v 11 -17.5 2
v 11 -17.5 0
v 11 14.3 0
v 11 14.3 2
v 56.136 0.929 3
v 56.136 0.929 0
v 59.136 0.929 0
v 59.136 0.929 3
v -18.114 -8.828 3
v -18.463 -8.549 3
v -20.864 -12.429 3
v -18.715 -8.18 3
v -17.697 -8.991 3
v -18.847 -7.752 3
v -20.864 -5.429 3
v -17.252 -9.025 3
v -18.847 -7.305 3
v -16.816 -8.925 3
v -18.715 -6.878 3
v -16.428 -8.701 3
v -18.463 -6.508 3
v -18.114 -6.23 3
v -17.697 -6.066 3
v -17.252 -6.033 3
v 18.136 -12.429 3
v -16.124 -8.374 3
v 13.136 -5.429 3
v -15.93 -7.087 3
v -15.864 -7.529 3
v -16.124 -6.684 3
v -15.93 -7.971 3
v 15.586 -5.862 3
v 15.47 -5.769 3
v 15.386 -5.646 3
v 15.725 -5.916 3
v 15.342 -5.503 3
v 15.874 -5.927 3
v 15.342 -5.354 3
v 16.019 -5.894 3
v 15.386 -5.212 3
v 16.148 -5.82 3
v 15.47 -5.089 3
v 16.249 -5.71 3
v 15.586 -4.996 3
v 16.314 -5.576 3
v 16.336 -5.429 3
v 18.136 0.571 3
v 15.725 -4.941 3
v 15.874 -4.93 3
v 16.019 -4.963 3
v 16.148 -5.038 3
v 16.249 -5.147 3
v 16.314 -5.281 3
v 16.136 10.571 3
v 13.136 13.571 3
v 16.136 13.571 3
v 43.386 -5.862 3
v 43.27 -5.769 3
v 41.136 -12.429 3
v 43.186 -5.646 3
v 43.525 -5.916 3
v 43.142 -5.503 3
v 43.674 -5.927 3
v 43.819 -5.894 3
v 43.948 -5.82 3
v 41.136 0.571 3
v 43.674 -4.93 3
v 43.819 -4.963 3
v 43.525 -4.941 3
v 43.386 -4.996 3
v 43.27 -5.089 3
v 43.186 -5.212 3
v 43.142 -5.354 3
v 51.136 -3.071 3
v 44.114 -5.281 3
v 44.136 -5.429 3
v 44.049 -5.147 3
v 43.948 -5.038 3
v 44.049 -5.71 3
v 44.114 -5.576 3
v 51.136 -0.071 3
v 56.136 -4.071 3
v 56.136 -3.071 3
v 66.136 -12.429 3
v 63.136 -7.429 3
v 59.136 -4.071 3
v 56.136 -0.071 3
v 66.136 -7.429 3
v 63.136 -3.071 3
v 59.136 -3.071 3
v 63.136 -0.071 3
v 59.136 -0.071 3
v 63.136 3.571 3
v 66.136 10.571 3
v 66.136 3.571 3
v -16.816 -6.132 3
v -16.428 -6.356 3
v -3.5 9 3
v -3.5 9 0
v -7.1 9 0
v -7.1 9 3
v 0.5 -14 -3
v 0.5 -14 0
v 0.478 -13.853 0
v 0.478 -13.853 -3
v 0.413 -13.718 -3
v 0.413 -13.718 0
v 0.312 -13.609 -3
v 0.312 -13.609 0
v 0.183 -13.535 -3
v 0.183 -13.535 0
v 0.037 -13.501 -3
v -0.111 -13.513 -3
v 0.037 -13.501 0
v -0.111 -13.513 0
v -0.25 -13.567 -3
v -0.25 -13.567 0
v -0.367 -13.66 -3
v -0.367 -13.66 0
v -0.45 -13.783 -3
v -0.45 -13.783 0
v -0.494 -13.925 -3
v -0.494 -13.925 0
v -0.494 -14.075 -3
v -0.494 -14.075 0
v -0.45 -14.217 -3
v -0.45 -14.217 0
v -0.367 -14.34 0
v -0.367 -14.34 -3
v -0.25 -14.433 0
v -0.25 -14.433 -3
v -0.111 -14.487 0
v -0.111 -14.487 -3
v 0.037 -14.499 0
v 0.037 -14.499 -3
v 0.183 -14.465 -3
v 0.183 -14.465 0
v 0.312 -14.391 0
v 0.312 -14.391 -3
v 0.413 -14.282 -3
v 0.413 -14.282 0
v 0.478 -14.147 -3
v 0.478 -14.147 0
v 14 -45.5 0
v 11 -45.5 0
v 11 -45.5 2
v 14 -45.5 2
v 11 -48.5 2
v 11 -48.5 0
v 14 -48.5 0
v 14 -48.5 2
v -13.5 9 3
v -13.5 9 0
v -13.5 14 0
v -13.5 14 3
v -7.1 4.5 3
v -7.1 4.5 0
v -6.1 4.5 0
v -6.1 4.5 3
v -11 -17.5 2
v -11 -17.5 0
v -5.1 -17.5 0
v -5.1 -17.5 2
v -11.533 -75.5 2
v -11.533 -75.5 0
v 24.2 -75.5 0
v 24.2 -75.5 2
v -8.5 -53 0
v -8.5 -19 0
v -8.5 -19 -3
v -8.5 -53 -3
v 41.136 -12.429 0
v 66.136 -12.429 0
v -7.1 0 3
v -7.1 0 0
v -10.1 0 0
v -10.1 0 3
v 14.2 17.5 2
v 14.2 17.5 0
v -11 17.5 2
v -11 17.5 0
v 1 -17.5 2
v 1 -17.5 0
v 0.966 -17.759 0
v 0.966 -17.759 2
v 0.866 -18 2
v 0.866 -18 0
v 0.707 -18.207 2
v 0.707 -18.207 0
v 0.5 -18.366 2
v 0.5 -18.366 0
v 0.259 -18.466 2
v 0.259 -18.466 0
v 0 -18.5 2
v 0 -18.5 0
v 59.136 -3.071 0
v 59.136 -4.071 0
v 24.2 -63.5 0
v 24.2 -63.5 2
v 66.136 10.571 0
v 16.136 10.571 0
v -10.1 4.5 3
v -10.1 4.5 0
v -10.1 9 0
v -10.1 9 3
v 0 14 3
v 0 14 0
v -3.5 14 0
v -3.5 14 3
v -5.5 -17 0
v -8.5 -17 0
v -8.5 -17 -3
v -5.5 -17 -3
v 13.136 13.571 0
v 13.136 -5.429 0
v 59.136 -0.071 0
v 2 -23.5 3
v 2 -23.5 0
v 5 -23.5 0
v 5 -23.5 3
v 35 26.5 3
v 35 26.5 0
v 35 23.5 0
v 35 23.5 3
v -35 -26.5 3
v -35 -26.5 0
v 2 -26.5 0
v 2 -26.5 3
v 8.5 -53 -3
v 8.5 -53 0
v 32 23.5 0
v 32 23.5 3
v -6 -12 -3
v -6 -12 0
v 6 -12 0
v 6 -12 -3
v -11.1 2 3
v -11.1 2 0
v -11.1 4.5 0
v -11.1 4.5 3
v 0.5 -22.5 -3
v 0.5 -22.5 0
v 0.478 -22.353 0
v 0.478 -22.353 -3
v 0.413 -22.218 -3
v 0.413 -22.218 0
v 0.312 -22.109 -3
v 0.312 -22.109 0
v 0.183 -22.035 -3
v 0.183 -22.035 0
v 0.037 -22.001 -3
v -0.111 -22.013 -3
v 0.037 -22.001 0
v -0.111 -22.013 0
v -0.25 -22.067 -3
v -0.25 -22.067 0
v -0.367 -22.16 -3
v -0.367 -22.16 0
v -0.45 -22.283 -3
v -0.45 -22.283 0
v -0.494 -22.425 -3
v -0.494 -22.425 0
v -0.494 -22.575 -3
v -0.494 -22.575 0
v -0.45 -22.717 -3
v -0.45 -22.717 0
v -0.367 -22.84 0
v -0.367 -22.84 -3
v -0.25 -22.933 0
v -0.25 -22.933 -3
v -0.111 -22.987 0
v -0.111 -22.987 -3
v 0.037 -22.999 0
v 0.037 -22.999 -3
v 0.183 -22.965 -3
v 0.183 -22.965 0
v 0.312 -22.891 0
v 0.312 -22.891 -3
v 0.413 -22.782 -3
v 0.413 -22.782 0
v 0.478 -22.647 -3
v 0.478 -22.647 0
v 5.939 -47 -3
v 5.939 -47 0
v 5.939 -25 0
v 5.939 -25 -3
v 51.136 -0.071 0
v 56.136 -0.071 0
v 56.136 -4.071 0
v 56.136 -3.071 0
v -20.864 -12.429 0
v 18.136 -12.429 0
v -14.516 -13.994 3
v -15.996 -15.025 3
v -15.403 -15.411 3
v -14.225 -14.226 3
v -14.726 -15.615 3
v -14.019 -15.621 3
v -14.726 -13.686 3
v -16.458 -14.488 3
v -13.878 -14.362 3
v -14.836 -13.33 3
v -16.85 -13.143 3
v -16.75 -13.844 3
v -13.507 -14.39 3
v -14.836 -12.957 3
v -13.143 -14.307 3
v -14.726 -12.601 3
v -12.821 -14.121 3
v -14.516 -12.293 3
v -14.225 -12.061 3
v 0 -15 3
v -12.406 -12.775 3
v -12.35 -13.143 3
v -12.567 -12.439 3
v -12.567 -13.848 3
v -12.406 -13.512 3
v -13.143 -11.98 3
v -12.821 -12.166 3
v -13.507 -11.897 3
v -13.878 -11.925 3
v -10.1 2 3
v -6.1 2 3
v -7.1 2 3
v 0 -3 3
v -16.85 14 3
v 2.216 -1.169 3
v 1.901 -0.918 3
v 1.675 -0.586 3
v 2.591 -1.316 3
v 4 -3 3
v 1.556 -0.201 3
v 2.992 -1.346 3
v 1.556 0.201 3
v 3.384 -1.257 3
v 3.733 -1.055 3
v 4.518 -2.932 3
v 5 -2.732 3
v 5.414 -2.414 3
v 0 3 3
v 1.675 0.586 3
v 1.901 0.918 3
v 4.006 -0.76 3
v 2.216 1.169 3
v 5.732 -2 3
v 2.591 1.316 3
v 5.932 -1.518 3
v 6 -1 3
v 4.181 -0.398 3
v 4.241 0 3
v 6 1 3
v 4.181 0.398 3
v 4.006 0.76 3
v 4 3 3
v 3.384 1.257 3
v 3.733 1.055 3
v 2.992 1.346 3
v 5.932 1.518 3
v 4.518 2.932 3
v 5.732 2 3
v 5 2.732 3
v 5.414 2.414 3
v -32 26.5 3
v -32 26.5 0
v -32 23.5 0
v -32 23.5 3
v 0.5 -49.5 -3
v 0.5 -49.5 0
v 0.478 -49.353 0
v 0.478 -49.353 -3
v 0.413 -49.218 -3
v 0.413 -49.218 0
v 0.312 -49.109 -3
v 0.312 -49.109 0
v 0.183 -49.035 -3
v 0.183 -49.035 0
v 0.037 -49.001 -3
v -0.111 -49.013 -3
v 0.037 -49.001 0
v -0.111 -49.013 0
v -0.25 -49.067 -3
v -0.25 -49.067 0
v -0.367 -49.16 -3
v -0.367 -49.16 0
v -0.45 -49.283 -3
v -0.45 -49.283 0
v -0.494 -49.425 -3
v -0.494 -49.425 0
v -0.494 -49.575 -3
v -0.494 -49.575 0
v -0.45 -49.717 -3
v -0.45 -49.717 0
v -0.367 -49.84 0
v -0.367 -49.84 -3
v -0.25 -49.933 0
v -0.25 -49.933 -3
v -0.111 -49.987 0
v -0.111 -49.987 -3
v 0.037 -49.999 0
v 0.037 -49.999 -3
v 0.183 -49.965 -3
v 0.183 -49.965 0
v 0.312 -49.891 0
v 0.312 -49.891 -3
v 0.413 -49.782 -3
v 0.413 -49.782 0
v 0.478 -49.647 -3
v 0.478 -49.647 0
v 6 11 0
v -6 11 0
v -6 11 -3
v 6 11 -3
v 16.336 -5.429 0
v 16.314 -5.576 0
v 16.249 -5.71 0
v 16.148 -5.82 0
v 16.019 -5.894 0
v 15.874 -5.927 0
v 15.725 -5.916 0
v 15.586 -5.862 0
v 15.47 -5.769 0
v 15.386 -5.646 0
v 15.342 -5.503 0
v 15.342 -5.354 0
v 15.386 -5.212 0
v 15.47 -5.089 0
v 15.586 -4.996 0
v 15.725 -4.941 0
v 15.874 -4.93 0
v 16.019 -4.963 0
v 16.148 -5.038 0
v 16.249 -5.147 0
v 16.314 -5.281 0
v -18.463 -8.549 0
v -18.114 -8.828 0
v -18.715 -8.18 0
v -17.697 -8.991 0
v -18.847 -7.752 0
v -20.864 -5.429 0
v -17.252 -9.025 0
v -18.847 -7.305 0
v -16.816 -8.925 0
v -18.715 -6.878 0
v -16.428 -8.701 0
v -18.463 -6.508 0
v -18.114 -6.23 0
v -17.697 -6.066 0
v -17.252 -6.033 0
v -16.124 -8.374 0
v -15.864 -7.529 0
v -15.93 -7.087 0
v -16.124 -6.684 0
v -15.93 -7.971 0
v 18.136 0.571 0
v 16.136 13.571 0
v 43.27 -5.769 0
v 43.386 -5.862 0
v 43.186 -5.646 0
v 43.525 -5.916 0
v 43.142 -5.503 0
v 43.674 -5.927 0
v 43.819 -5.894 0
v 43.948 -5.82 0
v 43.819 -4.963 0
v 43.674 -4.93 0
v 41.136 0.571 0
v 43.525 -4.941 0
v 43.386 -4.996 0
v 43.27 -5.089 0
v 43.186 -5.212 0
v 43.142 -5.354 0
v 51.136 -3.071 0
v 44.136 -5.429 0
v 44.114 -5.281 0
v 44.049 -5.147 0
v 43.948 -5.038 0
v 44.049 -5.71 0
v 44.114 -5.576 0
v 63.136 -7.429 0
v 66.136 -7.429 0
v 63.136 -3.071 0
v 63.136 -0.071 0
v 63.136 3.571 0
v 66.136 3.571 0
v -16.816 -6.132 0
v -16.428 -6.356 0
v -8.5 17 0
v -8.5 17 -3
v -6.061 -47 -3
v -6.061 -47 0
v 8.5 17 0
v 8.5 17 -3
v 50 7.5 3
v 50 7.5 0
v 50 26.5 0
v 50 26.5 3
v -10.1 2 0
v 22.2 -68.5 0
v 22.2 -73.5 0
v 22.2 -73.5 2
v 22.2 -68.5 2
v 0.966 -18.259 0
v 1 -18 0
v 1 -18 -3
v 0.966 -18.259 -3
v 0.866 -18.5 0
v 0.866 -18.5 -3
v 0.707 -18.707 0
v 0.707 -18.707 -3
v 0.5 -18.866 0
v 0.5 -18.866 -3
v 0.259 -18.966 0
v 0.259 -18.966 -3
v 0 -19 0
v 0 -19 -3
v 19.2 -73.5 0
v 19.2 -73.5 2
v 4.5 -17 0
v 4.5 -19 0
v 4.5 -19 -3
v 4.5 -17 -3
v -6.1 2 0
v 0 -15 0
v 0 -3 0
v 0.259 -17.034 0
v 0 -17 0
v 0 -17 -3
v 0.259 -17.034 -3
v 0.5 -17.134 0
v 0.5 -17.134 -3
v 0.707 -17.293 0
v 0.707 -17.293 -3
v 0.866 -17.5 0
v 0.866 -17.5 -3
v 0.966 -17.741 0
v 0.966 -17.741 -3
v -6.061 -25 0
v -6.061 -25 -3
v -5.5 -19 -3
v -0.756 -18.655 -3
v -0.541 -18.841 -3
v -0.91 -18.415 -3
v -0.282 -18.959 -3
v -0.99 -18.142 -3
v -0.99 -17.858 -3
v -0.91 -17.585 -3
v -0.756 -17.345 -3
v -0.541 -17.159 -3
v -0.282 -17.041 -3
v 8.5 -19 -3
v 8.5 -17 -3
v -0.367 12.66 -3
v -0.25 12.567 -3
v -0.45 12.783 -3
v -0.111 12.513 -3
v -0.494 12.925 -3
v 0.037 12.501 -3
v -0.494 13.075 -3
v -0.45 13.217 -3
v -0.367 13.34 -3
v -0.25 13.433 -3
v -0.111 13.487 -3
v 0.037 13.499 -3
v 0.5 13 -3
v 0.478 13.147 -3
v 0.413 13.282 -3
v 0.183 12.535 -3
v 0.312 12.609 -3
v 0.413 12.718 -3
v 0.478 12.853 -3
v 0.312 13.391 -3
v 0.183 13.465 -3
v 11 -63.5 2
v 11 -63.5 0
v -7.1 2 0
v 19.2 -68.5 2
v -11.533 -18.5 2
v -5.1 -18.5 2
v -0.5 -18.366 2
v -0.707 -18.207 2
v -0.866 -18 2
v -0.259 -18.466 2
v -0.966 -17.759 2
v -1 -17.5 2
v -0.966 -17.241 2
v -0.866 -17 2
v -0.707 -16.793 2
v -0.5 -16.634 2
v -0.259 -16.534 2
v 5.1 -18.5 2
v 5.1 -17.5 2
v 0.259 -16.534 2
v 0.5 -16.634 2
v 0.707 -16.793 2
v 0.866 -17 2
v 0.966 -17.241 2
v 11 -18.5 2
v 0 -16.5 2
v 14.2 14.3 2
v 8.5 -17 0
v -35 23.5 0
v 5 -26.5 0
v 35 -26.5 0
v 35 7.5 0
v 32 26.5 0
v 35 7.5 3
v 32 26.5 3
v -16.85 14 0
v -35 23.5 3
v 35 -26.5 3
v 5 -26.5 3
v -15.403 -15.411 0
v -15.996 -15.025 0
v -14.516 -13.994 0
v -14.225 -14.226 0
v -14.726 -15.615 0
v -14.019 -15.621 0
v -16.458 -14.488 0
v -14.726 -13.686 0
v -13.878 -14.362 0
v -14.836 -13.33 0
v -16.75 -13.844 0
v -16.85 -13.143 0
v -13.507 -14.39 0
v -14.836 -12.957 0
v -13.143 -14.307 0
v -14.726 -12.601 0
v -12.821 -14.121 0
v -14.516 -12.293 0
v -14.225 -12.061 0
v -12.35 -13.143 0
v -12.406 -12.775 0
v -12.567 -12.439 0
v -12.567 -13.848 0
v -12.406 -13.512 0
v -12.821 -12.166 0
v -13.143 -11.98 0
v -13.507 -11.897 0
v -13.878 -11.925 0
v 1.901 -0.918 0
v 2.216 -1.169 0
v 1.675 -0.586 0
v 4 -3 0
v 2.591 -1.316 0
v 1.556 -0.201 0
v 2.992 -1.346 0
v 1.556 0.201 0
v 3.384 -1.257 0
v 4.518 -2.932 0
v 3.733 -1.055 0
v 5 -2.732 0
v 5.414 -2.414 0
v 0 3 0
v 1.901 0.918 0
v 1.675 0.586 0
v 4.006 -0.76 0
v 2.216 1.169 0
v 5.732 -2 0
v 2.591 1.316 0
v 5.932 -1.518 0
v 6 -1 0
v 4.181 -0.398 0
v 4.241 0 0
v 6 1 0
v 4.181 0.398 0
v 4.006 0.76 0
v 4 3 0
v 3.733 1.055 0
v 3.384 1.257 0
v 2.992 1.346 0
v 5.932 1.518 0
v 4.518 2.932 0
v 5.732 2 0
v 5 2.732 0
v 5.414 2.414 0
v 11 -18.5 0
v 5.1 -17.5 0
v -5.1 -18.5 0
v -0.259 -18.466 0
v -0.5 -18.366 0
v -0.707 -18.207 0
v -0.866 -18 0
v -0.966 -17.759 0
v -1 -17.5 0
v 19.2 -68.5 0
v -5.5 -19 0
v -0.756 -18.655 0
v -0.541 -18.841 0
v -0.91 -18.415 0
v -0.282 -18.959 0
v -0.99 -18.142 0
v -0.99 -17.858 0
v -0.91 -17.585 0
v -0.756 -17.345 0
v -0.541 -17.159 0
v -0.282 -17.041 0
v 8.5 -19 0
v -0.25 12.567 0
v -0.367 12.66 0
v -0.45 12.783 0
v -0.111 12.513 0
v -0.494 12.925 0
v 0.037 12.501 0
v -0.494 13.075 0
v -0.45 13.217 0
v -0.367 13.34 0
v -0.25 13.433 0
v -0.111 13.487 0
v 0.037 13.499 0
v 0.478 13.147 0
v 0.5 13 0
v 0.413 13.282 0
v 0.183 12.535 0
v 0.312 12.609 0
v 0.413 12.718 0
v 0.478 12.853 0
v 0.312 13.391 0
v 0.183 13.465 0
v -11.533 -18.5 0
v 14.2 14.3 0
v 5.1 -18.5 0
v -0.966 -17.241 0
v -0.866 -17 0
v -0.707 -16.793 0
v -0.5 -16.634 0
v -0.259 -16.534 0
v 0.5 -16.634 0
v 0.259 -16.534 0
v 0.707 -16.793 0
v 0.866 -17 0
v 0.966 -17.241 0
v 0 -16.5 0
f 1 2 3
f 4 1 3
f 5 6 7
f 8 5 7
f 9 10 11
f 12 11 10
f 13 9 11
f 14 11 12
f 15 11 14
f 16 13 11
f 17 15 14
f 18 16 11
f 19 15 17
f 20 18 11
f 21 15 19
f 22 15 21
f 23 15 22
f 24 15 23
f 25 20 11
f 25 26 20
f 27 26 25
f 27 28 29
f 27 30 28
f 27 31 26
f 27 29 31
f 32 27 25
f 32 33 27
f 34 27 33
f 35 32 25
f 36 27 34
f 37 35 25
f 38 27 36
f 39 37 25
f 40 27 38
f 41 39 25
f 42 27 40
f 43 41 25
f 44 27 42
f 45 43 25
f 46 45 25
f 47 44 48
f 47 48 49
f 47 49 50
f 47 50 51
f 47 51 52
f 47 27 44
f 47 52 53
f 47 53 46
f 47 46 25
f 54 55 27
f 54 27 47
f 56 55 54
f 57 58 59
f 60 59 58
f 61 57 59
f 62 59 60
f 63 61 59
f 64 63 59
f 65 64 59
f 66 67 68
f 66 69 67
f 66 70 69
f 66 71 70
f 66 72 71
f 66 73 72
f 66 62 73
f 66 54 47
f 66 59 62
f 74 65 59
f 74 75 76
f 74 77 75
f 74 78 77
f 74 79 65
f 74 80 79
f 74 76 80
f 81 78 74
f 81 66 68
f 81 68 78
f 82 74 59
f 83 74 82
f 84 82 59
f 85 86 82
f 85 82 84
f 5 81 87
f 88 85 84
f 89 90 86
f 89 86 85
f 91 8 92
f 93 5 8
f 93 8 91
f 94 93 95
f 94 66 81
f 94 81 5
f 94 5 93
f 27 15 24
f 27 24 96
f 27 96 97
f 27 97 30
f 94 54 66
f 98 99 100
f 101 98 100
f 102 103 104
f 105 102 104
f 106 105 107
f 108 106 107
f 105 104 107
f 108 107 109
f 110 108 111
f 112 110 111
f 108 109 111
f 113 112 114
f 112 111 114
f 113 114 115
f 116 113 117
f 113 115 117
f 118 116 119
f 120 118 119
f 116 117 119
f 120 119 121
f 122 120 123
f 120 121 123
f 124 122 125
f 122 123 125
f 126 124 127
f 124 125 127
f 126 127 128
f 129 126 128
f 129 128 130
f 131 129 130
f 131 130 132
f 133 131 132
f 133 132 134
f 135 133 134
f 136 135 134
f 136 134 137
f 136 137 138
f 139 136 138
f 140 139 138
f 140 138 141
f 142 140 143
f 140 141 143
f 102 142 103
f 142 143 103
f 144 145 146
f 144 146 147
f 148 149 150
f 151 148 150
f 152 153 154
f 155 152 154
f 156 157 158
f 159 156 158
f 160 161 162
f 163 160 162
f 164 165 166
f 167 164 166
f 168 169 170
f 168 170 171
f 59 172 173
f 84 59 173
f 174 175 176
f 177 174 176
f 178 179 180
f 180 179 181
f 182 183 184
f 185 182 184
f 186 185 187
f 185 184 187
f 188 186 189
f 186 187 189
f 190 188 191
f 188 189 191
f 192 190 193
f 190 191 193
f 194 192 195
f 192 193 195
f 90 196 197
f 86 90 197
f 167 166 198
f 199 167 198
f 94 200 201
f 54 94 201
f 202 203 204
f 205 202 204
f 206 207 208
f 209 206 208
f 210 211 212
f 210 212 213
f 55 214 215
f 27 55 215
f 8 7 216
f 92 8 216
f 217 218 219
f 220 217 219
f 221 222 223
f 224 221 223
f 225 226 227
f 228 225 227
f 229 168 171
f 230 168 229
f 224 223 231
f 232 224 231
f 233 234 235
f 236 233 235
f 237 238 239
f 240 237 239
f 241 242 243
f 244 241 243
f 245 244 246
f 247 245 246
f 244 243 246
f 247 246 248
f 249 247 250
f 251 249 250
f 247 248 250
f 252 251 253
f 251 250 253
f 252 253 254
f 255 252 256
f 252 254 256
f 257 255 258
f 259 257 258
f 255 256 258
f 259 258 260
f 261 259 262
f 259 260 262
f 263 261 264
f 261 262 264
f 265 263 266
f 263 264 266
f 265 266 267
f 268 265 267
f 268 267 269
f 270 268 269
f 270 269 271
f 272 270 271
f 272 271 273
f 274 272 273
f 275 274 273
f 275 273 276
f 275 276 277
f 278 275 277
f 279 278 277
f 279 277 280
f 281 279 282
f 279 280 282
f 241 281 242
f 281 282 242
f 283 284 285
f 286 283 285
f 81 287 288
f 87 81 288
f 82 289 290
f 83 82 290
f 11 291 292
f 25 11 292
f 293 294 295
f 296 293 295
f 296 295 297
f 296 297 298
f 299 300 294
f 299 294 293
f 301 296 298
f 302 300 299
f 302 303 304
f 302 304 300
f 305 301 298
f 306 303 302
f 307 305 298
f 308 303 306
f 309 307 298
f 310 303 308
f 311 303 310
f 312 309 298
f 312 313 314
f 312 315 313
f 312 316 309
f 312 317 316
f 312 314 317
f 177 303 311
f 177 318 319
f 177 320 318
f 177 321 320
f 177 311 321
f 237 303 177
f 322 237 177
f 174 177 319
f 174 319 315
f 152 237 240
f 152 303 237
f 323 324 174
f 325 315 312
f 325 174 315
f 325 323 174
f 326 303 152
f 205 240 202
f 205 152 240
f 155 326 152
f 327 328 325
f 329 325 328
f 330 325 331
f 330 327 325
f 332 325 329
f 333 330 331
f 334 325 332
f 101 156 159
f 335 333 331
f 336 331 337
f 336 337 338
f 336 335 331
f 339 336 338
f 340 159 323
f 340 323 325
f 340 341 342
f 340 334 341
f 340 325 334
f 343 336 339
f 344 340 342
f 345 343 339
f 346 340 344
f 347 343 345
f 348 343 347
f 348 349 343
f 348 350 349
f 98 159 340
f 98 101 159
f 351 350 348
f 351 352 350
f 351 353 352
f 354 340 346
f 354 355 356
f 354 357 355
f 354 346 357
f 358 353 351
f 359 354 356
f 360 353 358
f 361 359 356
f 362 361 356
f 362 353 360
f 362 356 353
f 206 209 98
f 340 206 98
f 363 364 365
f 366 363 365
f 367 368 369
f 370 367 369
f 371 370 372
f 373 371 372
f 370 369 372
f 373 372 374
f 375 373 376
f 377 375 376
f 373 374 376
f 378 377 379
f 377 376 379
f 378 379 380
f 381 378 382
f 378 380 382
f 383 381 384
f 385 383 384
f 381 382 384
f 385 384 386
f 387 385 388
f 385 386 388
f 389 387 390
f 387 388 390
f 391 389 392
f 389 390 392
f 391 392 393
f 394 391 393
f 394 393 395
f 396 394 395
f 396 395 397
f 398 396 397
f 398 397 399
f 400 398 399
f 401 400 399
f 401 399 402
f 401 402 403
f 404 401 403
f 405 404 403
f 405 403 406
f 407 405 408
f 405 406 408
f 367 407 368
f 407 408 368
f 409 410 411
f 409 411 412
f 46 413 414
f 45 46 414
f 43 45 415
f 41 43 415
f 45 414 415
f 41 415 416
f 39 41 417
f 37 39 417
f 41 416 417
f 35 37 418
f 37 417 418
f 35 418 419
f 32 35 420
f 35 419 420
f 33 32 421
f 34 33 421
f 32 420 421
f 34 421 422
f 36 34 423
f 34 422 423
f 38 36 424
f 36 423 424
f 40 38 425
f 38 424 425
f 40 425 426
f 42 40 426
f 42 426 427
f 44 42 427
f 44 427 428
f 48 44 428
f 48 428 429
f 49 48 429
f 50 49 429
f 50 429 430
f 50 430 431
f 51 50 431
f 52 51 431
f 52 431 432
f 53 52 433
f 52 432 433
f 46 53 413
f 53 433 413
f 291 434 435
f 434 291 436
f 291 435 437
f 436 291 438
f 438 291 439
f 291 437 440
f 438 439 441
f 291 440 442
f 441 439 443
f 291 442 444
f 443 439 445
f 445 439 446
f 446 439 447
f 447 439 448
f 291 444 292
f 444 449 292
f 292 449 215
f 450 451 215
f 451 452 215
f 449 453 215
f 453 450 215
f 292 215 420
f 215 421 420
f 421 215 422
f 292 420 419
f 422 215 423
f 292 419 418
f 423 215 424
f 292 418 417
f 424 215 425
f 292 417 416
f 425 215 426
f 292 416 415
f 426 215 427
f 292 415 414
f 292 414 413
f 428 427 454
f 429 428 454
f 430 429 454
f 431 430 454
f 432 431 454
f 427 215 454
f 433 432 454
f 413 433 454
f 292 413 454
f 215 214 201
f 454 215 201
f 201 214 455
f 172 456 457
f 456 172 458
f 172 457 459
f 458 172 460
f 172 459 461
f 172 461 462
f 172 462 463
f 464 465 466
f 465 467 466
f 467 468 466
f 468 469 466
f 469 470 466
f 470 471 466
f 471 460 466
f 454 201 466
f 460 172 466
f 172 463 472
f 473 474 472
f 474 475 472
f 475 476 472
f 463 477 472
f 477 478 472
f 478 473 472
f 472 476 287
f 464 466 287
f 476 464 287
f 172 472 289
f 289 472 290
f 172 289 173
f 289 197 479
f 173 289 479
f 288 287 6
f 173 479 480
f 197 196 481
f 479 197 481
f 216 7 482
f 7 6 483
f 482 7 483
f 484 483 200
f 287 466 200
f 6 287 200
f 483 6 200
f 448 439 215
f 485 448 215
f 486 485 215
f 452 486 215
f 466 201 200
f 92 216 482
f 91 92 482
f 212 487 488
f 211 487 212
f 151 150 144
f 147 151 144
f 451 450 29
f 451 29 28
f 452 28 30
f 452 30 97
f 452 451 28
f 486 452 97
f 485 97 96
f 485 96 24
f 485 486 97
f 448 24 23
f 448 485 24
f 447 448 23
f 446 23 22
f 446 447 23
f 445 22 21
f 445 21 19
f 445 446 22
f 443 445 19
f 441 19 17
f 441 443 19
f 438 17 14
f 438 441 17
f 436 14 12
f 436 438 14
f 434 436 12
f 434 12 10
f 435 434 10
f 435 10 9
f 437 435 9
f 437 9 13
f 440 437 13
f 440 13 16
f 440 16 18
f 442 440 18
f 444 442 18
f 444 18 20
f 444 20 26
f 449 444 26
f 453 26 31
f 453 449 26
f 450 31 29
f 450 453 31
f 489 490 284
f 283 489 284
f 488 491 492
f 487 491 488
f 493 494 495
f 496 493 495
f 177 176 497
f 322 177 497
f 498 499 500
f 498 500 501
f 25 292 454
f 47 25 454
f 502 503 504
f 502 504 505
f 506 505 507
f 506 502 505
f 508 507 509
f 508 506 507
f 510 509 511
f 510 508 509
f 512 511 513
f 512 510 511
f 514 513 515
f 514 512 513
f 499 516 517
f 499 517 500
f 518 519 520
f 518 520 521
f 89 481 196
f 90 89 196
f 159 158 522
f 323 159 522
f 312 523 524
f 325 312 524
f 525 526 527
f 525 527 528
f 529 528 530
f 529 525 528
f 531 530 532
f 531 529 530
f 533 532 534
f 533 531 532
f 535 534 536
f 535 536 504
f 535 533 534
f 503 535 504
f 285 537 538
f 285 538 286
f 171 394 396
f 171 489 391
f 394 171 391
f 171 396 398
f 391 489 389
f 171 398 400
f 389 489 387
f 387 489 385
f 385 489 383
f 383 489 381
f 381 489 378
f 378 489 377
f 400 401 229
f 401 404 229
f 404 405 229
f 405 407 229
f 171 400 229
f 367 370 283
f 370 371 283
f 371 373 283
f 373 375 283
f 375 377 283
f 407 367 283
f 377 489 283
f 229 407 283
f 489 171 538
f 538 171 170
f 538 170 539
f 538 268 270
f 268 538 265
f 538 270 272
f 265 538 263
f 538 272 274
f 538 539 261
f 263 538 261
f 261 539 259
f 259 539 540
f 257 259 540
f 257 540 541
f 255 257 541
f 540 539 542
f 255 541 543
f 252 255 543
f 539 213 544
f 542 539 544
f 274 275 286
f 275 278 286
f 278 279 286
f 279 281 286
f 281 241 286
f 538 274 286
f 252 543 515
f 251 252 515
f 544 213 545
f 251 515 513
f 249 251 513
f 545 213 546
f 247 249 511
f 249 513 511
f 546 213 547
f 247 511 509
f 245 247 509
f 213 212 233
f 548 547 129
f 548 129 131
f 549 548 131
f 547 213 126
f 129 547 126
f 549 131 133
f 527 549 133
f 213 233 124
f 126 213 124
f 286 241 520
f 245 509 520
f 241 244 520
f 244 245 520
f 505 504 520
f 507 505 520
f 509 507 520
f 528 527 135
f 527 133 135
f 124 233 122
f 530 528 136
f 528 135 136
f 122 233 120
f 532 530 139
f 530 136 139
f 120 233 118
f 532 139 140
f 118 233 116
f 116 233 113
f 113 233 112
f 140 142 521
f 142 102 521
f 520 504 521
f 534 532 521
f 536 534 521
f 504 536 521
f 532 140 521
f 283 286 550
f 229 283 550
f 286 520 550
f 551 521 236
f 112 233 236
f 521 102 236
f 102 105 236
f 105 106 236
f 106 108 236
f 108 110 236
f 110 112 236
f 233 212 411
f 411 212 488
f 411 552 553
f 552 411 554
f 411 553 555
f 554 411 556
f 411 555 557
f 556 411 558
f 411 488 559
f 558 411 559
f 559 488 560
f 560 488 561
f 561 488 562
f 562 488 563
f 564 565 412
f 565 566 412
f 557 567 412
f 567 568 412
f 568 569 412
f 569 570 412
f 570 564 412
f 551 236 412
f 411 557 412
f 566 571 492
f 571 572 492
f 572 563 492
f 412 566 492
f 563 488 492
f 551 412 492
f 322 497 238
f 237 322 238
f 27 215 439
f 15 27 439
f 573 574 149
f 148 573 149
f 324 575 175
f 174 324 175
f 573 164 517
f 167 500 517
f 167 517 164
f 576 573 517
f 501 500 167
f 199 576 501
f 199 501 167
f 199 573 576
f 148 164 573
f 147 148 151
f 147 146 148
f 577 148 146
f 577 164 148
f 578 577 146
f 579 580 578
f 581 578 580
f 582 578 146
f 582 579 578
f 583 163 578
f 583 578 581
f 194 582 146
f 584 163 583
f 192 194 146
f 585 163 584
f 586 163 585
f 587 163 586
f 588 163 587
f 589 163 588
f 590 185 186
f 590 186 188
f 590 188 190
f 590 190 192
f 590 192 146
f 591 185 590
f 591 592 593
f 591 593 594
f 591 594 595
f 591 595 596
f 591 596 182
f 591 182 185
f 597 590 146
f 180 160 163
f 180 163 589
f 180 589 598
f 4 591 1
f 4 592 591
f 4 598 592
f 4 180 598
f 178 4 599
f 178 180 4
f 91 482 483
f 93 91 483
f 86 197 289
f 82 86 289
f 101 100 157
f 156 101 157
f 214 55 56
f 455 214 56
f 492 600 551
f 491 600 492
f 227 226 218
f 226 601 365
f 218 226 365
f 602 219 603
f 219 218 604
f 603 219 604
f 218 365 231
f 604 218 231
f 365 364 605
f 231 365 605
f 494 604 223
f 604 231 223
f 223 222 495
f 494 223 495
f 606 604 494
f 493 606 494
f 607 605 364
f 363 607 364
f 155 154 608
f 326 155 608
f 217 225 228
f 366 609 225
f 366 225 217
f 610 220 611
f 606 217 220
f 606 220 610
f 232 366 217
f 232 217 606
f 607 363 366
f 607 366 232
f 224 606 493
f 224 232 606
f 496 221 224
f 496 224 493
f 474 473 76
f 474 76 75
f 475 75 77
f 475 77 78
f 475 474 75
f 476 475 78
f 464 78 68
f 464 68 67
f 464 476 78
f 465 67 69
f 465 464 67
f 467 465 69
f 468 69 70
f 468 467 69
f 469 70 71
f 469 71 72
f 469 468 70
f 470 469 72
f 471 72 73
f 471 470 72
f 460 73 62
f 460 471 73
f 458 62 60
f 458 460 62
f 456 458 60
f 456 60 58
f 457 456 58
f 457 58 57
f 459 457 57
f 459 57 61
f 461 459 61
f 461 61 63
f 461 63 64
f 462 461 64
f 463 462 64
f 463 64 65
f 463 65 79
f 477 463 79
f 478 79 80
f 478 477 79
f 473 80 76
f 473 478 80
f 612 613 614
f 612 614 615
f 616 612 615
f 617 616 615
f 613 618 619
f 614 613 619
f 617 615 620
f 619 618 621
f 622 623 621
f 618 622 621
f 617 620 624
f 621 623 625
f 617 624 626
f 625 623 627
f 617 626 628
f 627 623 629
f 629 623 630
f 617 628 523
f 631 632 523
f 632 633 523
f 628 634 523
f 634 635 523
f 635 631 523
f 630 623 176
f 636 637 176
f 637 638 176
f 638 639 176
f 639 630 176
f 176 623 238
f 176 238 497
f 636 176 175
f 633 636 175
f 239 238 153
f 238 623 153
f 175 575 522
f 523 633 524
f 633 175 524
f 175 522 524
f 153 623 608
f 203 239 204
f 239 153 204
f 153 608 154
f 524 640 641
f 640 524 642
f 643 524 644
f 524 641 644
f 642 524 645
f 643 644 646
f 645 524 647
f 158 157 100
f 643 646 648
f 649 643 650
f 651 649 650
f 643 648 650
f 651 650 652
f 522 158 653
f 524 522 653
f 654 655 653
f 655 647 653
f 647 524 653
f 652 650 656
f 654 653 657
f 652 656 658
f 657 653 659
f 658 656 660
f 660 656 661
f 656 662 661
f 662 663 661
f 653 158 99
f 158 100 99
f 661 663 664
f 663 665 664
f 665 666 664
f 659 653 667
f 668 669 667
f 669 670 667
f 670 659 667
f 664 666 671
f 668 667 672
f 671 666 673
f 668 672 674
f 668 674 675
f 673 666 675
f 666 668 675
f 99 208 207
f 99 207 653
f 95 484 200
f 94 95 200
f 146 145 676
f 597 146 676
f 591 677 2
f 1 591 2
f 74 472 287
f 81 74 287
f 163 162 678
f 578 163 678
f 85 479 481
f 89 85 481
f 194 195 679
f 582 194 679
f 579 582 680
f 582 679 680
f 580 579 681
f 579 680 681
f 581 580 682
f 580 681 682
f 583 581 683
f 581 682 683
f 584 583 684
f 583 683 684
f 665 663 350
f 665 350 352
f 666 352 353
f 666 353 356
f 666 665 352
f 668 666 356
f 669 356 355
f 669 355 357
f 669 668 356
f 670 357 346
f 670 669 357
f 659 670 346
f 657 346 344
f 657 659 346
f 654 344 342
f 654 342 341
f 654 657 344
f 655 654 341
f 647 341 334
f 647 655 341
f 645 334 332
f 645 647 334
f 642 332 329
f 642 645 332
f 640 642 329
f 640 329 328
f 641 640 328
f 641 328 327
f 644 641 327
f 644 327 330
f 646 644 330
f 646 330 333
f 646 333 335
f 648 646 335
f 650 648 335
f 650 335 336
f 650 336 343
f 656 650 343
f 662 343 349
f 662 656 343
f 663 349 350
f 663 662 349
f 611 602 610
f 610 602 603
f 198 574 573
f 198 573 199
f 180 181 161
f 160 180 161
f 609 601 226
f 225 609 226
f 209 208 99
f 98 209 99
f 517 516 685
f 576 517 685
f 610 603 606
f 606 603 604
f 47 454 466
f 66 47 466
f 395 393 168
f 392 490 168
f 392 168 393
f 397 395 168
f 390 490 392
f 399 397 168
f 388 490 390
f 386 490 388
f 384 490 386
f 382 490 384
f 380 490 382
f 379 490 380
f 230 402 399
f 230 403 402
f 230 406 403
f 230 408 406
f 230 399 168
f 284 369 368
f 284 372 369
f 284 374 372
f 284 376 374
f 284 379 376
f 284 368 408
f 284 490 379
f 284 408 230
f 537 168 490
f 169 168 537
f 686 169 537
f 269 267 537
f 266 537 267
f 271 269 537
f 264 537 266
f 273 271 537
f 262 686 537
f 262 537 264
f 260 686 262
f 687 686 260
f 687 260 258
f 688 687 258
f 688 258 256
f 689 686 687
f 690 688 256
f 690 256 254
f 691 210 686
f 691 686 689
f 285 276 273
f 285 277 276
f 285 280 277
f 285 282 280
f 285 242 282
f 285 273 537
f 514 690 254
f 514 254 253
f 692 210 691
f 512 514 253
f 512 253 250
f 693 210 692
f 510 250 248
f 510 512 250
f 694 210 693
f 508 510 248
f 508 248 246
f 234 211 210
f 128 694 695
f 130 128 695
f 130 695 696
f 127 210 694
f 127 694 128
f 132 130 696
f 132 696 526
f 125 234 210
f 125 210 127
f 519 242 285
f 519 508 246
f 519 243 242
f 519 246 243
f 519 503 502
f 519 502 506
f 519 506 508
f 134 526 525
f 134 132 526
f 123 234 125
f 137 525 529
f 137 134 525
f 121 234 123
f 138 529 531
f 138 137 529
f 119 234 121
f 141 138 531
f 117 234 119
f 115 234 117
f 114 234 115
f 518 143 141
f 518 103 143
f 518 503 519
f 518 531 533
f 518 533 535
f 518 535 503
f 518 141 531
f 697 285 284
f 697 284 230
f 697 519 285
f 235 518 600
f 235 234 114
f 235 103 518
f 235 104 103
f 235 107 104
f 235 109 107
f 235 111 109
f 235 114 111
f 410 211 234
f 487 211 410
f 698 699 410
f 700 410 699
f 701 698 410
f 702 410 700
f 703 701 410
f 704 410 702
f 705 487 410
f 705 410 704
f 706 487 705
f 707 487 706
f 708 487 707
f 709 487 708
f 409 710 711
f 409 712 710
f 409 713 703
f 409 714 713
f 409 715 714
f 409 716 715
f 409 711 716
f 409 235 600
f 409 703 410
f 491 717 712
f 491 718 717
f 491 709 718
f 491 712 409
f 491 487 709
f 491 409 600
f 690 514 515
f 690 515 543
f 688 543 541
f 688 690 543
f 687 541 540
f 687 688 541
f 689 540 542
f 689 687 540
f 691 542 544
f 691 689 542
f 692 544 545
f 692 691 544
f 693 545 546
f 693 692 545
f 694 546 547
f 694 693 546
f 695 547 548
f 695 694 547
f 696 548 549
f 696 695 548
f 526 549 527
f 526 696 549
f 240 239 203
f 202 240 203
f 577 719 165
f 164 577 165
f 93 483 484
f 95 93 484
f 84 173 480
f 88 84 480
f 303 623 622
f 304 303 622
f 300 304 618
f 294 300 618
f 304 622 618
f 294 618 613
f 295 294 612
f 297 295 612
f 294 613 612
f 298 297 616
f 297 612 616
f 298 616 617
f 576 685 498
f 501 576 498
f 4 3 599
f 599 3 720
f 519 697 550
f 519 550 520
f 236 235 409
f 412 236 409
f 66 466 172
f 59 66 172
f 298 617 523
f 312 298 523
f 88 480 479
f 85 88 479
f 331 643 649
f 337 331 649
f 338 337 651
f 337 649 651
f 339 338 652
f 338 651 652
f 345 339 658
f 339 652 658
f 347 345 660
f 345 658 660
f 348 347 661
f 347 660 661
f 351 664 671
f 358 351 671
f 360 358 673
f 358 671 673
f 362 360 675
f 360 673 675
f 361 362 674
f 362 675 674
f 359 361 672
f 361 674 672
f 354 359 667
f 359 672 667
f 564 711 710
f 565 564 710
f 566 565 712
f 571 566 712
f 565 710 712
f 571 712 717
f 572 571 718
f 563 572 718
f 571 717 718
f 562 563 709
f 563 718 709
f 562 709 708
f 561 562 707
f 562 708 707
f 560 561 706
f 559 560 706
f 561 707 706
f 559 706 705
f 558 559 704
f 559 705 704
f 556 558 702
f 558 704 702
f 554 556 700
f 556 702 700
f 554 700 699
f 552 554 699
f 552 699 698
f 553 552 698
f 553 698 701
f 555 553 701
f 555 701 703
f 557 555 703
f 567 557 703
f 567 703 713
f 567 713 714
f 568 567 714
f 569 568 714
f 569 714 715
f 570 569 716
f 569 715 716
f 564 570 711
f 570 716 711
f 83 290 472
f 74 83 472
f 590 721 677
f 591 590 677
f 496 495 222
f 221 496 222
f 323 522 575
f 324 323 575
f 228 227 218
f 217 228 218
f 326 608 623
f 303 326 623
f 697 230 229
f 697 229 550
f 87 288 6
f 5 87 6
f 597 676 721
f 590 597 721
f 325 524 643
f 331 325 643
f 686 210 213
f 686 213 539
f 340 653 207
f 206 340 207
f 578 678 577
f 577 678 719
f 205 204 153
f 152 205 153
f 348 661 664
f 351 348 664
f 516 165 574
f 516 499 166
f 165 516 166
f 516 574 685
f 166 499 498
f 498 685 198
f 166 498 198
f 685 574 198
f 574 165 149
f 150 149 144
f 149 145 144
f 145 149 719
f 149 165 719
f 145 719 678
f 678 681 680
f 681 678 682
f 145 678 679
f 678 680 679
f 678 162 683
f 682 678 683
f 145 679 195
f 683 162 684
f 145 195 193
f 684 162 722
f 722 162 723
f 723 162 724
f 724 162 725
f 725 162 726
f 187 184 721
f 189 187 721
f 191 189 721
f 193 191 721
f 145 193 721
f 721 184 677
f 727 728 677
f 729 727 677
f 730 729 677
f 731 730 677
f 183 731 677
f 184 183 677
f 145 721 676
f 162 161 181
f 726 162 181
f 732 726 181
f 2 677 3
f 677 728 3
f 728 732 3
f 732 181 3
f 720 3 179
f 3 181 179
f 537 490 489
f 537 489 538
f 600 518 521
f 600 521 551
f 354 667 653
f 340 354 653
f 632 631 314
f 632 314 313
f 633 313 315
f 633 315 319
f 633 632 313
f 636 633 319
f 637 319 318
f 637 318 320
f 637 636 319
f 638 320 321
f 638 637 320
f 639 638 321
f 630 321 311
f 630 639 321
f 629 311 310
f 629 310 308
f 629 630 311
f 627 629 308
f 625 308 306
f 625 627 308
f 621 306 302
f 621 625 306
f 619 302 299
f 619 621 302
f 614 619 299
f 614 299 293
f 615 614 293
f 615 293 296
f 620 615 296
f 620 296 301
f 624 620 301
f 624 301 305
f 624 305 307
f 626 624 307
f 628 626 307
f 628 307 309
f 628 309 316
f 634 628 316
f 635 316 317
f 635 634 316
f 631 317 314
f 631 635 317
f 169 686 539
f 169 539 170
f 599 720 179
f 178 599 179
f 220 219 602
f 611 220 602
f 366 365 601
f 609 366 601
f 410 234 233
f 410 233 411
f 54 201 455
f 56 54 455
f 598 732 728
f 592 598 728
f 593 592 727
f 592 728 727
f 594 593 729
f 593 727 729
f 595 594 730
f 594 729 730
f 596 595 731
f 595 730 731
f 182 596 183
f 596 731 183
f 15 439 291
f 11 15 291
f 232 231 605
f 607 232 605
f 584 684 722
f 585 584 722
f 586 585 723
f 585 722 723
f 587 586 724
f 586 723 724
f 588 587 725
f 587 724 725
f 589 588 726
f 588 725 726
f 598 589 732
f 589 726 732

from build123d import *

# Parameters (mm, degrees)
F0_W     = 13.2
F0_H     = 12
F0_W_2   = 3
F0_H_2   = 5
F0_H_3   = 3
F0_W_3   = 3.2
F0_H_4   = 3.2
F1_DEPTH = 2
F3_DEPTH = 3
F4_R     = 0.5
F4_W     = 12
F4_H     = 23
F4_H_2   = 22
F5_DEPTH = 3
F6_R     = 1.35
F6_R_2   = 1.25
F7_DEPTH = 3
F8_W     = 3
F8_H     = 3
F8_R     = 1.5
F8_R_2   = 0.5
F9_DEPTH = 3


with BuildPart() as f1:
    # F0 (on Top) → F1 (new body)
    with BuildSketch(Plane.XY):
        Polygon((-3.4e-09, -18.5), (-5.1, -18.5), (-11.533, -18.5), (-11.533, -75.5), (11, -75.5), (11, -63.5), (11, -48.5), (11, -45.5), (11, -18.5), (5.1, -18.5), align=None)
        with Locations((17.6, -69.5)):
            Rectangle(F0_W, F0_H)
        with Locations((20.7, -71)):
            Rectangle(F0_W_2, F0_H_2, mode=Mode.SUBTRACT)
        with Locations((12.5, -47)):
            Rectangle(F0_W_2, F0_H_3)
        Polygon((11, 14.3), (11, 17.5), (-11, 17.5), (-11, -17.5), (-5.1, -17.5), (-5.1, -16.5), (0, -16.5), (5.1, -16.5), (5.1, -17.5), (11, -17.5), align=None)
        with Locations((12.6, 15.9)):
            Rectangle(F0_W_3, F0_H_4)
        with BuildLine():
            Line((5.1, -18.5), (5.1, -17.5))
            Line((5.1, -17.5), (1, -17.5))
            ThreePointArc((1, -17.5), (0.70710678, -18.2071067824), (-3.4e-09, -18.5))
            Line((-3.4e-09, -18.5), (5.1, -18.5))
        make_face()
        with BuildLine():
            Line((1, -17.5), (5.1, -17.5))
            Line((5.1, -17.5), (5.1, -16.5))
            Line((5.1, -16.5), (0, -16.5))
            ThreePointArc((0, -16.5), (0.7071067812, -16.7928932188), (1, -17.5))
        make_face()
        with BuildLine():
            Line((-1, -17.5), (-5.1, -17.5))
            Line((-5.1, -17.5), (-5.1, -18.5))
            Line((-5.1, -18.5), (-3.4e-09, -18.5))
            ThreePointArc((-3.4e-09, -18.5), (-0.7071067824, -18.20710678), (-1, -17.5))
        make_face()
        with BuildLine():
            Line((-5.1, -16.5), (-5.1, -17.5))
            Line((-5.1, -17.5), (-1, -17.5))
            ThreePointArc((-1, -17.5), (-0.7071067812, -16.7928932188), (0, -16.5))
            Line((0, -16.5), (-5.1, -16.5))
        make_face()
    extrude(amount=F1_DEPTH)


with BuildPart() as f3:
    # F2 (on Top) → F3 (new body)
    with BuildSketch(Plane.XY):
        Polygon((50, 26.5), (35, 26.5), (35, 23.5), (35, 7.5), (50, 7.5), align=None)
        Polygon((32, 23.5), (32, 26.5), (-32, 26.5), (-32, 23.5), (-35, 23.5), (-35, -26.5), (2, -26.5), (2, -23.5), (5, -23.5), (5, -26.5), (35, -26.5), (35, 7.5), (35, 23.5), align=None)
    extrude(amount=F3_DEPTH)


with BuildPart() as f5:
    # F4 (on Top) → F5 (new body)
    with BuildSketch(Plane.XY):
        Polygon((8.5, -17), (8.5, 17), (-8.5, 17), (-8.5, -17), (-5.5, -17), (0, -17), (4.5, -17), align=None)
        with Locations((0, -14)):
            Circle(F4_R, mode=Mode.SUBTRACT)
        with Locations((0, -0.5)):
            Rectangle(F4_W, F4_H, mode=Mode.SUBTRACT)
        with Locations((0, 13)):
            Circle(F4_R, mode=Mode.SUBTRACT)
        with BuildLine():
            Line((4.5, -19), (4.5, -17))
            Line((4.5, -17), (0, -17))
            ThreePointArc((0, -17), (0.7071067812, -17.2928932188), (1, -18))
            ThreePointArc((1, -18), (0.70710678, -18.7071067824), (-3.4e-09, -19))
            Line((-3.4e-09, -19), (4.5, -19))
        make_face()
        with BuildLine():
            Line((0, -17), (-5.5, -17))
            Line((-5.5, -17), (-5.5, -19))
            Line((-5.5, -19), (-3.4e-09, -19))
            ThreePointArc((-3.4e-09, -19), (-1, -17.9999999983), (0, -17))
        make_face()
        Polygon((8.5, -19), (4.5, -19), (-3.4e-09, -19), (-5.5, -19), (-8.5, -19), (-8.5, -53), (8.5, -53), align=None)
        with Locations((-0.0608968027, -36)):
            Rectangle(F4_W, F4_H_2, mode=Mode.SUBTRACT)
        with Locations((0, -49.5)):
            Circle(F4_R, mode=Mode.SUBTRACT)
        with Locations((0, -22.5)):
            Circle(F4_R, mode=Mode.SUBTRACT)
    extrude(amount=-F5_DEPTH)


with BuildPart() as f7:
    # F6 (on Top) → F7 (new body)
    with BuildSketch(Plane.XY):
        with BuildLine():
            Line((4, 3), (0, 3))
            Line((0, 3), (0, -3))
            Line((0, -3), (4, -3))
            ThreePointArc((4, -3), (5.4142135624, -2.4142135624), (6, -1))
            Line((6, -1), (6, 1))
            ThreePointArc((6, 1), (5.4142135624, 2.4142135624), (4, 3))
        make_face()
        with Locations((2.8909749817, 0)):
            Circle(F6_R, mode=Mode.SUBTRACT)
        with BuildLine():
            Line((-13.5, 14), (-16.8499713292, 14))
            Line((-16.8499713292, 14), (-16.8499713292, -13.1433860515))
            ThreePointArc((-16.8499713292, -13.1433860515), (-15.9964054633, -15.0246767366), (-14.0185676156, -15.6213230117))
            Line((-14.0185676156, -15.6213230117), (0, -15))
            Line((0, -15), (0, -13.7464547476))
            Line((0, -13.7464547476), (0, -3))
            Line((0, -3), (0, 3))
            Line((0, 3), (0, 14))
            Line((0, 14), (-3.5, 14))
            Line((-3.5, 14), (-3.5, 9))
            Line((-3.5, 9), (-7.1, 9))
            Line((-7.1, 9), (-7.1, 4.5))
            Line((-7.1, 4.5), (-6.1, 4.5))
            Line((-6.1, 4.5), (-6.1, 2))
            Line((-6.1, 2), (-7.1, 2))
            Line((-7.1, 2), (-7.1, 0))
            Line((-7.1, 0), (-10.1, 0))
            Line((-10.1, 0), (-10.1, 2))
            Line((-10.1, 2), (-11.1, 2))
            Line((-11.1, 2), (-11.1, 4.5))
            Line((-11.1, 4.5), (-10.1, 4.5))
            Line((-10.1, 4.5), (-10.1, 9))
            Line((-10.1, 9), (-13.5, 9))
            Line((-13.5, 9), (-13.5, 14))
        make_face()
        with Locations((-13.5999713292, -13.1433860515)):
            Circle(F6_R_2, mode=Mode.SUBTRACT)
    extrude(amount=F7_DEPTH)


with BuildPart() as f9:
    # F8 (on Top) → F9 (new body)
    with BuildSketch(Plane.XY):
        with Locations((14.6363672018, 12.071258156)):
            Rectangle(F8_W, F8_H)
        with BuildLine():
            Line((13.1363672018, -5.428741844), (-20.8636327982, -5.428741844))
            Line((-20.8636327982, -5.428741844), (-20.8636327982, -12.428741844))
            Line((-20.8636327982, -12.428741844), (18.1363672018, -12.428741844))
            Line((18.1363672018, -12.428741844), (18.1363672018, -5.428741844))
            Line((18.1363672018, -5.428741844), (16.3363672018, -5.428741844))
            ThreePointArc((16.3363672018, -5.428741844), (15.8363672018, -5.928741844), (15.3363672018, -5.428741844))
            Line((15.3363672018, -5.428741844), (13.1363672018, -5.428741844))
        make_face()
        with Locations((-17.3636327982, -7.528741844)):
            Circle(F8_R, mode=Mode.SUBTRACT)
        with BuildLine():
            Line((13.1363672018, 10.571258156), (13.1363672018, -5.428741844))
            Line((13.1363672018, -5.428741844), (15.3363672018, -5.428741844))
            ThreePointArc((15.3363672018, -5.428741844), (15.8363672018, -4.928741844), (16.3363672018, -5.428741844))
            Line((16.3363672018, -5.428741844), (18.1363672018, -5.428741844))
            Line((18.1363672018, -5.428741844), (18.1363672018, 0.571258156))
            Line((18.1363672018, 0.571258156), (18.1363672018, 10.571258156))
            Line((18.1363672018, 10.571258156), (16.1363672018, 10.571258156))
            Line((16.1363672018, 10.571258156), (13.1363672018, 10.571258156))
        make_face()
        Polygon((41.1363672018, 0.571258156), (41.1363672018, -12.428741844), (66.1363672018, -12.428741844), (66.1363672018, -7.428741844), (63.1363672018, -7.428741844), (63.1363672018, -3.0713211745), (59.1363672018, -3.0713211745), (59.1363672018, -4.0713211745), (56.1363672018, -4.0713211745), (56.1363672018, -3.0713211745), (51.1363672018, -3.0713211745), (51.1363672018, -0.0713211745), (56.1363672018, -0.0713211745), (56.1363672018, 0.9286788255), (59.1363672018, 0.9286788255), (59.1363672018, -0.0713211745), (63.1363672018, -0.0713211745), (63.1363672018, 3.571258156), (66.1363672018, 3.571258156), (66.1363672018, 10.571258156), (18.1363672018, 10.571258156), (18.1363672018, 0.571258156), align=None)
        with Locations((43.6363672018, -5.428741844)):
            Circle(F8_R_2, mode=Mode.SUBTRACT)
    extrude(amount=F9_DEPTH)


solid = Compound([f1.part, f3.part, f5.part, f7.part, f9.part])
